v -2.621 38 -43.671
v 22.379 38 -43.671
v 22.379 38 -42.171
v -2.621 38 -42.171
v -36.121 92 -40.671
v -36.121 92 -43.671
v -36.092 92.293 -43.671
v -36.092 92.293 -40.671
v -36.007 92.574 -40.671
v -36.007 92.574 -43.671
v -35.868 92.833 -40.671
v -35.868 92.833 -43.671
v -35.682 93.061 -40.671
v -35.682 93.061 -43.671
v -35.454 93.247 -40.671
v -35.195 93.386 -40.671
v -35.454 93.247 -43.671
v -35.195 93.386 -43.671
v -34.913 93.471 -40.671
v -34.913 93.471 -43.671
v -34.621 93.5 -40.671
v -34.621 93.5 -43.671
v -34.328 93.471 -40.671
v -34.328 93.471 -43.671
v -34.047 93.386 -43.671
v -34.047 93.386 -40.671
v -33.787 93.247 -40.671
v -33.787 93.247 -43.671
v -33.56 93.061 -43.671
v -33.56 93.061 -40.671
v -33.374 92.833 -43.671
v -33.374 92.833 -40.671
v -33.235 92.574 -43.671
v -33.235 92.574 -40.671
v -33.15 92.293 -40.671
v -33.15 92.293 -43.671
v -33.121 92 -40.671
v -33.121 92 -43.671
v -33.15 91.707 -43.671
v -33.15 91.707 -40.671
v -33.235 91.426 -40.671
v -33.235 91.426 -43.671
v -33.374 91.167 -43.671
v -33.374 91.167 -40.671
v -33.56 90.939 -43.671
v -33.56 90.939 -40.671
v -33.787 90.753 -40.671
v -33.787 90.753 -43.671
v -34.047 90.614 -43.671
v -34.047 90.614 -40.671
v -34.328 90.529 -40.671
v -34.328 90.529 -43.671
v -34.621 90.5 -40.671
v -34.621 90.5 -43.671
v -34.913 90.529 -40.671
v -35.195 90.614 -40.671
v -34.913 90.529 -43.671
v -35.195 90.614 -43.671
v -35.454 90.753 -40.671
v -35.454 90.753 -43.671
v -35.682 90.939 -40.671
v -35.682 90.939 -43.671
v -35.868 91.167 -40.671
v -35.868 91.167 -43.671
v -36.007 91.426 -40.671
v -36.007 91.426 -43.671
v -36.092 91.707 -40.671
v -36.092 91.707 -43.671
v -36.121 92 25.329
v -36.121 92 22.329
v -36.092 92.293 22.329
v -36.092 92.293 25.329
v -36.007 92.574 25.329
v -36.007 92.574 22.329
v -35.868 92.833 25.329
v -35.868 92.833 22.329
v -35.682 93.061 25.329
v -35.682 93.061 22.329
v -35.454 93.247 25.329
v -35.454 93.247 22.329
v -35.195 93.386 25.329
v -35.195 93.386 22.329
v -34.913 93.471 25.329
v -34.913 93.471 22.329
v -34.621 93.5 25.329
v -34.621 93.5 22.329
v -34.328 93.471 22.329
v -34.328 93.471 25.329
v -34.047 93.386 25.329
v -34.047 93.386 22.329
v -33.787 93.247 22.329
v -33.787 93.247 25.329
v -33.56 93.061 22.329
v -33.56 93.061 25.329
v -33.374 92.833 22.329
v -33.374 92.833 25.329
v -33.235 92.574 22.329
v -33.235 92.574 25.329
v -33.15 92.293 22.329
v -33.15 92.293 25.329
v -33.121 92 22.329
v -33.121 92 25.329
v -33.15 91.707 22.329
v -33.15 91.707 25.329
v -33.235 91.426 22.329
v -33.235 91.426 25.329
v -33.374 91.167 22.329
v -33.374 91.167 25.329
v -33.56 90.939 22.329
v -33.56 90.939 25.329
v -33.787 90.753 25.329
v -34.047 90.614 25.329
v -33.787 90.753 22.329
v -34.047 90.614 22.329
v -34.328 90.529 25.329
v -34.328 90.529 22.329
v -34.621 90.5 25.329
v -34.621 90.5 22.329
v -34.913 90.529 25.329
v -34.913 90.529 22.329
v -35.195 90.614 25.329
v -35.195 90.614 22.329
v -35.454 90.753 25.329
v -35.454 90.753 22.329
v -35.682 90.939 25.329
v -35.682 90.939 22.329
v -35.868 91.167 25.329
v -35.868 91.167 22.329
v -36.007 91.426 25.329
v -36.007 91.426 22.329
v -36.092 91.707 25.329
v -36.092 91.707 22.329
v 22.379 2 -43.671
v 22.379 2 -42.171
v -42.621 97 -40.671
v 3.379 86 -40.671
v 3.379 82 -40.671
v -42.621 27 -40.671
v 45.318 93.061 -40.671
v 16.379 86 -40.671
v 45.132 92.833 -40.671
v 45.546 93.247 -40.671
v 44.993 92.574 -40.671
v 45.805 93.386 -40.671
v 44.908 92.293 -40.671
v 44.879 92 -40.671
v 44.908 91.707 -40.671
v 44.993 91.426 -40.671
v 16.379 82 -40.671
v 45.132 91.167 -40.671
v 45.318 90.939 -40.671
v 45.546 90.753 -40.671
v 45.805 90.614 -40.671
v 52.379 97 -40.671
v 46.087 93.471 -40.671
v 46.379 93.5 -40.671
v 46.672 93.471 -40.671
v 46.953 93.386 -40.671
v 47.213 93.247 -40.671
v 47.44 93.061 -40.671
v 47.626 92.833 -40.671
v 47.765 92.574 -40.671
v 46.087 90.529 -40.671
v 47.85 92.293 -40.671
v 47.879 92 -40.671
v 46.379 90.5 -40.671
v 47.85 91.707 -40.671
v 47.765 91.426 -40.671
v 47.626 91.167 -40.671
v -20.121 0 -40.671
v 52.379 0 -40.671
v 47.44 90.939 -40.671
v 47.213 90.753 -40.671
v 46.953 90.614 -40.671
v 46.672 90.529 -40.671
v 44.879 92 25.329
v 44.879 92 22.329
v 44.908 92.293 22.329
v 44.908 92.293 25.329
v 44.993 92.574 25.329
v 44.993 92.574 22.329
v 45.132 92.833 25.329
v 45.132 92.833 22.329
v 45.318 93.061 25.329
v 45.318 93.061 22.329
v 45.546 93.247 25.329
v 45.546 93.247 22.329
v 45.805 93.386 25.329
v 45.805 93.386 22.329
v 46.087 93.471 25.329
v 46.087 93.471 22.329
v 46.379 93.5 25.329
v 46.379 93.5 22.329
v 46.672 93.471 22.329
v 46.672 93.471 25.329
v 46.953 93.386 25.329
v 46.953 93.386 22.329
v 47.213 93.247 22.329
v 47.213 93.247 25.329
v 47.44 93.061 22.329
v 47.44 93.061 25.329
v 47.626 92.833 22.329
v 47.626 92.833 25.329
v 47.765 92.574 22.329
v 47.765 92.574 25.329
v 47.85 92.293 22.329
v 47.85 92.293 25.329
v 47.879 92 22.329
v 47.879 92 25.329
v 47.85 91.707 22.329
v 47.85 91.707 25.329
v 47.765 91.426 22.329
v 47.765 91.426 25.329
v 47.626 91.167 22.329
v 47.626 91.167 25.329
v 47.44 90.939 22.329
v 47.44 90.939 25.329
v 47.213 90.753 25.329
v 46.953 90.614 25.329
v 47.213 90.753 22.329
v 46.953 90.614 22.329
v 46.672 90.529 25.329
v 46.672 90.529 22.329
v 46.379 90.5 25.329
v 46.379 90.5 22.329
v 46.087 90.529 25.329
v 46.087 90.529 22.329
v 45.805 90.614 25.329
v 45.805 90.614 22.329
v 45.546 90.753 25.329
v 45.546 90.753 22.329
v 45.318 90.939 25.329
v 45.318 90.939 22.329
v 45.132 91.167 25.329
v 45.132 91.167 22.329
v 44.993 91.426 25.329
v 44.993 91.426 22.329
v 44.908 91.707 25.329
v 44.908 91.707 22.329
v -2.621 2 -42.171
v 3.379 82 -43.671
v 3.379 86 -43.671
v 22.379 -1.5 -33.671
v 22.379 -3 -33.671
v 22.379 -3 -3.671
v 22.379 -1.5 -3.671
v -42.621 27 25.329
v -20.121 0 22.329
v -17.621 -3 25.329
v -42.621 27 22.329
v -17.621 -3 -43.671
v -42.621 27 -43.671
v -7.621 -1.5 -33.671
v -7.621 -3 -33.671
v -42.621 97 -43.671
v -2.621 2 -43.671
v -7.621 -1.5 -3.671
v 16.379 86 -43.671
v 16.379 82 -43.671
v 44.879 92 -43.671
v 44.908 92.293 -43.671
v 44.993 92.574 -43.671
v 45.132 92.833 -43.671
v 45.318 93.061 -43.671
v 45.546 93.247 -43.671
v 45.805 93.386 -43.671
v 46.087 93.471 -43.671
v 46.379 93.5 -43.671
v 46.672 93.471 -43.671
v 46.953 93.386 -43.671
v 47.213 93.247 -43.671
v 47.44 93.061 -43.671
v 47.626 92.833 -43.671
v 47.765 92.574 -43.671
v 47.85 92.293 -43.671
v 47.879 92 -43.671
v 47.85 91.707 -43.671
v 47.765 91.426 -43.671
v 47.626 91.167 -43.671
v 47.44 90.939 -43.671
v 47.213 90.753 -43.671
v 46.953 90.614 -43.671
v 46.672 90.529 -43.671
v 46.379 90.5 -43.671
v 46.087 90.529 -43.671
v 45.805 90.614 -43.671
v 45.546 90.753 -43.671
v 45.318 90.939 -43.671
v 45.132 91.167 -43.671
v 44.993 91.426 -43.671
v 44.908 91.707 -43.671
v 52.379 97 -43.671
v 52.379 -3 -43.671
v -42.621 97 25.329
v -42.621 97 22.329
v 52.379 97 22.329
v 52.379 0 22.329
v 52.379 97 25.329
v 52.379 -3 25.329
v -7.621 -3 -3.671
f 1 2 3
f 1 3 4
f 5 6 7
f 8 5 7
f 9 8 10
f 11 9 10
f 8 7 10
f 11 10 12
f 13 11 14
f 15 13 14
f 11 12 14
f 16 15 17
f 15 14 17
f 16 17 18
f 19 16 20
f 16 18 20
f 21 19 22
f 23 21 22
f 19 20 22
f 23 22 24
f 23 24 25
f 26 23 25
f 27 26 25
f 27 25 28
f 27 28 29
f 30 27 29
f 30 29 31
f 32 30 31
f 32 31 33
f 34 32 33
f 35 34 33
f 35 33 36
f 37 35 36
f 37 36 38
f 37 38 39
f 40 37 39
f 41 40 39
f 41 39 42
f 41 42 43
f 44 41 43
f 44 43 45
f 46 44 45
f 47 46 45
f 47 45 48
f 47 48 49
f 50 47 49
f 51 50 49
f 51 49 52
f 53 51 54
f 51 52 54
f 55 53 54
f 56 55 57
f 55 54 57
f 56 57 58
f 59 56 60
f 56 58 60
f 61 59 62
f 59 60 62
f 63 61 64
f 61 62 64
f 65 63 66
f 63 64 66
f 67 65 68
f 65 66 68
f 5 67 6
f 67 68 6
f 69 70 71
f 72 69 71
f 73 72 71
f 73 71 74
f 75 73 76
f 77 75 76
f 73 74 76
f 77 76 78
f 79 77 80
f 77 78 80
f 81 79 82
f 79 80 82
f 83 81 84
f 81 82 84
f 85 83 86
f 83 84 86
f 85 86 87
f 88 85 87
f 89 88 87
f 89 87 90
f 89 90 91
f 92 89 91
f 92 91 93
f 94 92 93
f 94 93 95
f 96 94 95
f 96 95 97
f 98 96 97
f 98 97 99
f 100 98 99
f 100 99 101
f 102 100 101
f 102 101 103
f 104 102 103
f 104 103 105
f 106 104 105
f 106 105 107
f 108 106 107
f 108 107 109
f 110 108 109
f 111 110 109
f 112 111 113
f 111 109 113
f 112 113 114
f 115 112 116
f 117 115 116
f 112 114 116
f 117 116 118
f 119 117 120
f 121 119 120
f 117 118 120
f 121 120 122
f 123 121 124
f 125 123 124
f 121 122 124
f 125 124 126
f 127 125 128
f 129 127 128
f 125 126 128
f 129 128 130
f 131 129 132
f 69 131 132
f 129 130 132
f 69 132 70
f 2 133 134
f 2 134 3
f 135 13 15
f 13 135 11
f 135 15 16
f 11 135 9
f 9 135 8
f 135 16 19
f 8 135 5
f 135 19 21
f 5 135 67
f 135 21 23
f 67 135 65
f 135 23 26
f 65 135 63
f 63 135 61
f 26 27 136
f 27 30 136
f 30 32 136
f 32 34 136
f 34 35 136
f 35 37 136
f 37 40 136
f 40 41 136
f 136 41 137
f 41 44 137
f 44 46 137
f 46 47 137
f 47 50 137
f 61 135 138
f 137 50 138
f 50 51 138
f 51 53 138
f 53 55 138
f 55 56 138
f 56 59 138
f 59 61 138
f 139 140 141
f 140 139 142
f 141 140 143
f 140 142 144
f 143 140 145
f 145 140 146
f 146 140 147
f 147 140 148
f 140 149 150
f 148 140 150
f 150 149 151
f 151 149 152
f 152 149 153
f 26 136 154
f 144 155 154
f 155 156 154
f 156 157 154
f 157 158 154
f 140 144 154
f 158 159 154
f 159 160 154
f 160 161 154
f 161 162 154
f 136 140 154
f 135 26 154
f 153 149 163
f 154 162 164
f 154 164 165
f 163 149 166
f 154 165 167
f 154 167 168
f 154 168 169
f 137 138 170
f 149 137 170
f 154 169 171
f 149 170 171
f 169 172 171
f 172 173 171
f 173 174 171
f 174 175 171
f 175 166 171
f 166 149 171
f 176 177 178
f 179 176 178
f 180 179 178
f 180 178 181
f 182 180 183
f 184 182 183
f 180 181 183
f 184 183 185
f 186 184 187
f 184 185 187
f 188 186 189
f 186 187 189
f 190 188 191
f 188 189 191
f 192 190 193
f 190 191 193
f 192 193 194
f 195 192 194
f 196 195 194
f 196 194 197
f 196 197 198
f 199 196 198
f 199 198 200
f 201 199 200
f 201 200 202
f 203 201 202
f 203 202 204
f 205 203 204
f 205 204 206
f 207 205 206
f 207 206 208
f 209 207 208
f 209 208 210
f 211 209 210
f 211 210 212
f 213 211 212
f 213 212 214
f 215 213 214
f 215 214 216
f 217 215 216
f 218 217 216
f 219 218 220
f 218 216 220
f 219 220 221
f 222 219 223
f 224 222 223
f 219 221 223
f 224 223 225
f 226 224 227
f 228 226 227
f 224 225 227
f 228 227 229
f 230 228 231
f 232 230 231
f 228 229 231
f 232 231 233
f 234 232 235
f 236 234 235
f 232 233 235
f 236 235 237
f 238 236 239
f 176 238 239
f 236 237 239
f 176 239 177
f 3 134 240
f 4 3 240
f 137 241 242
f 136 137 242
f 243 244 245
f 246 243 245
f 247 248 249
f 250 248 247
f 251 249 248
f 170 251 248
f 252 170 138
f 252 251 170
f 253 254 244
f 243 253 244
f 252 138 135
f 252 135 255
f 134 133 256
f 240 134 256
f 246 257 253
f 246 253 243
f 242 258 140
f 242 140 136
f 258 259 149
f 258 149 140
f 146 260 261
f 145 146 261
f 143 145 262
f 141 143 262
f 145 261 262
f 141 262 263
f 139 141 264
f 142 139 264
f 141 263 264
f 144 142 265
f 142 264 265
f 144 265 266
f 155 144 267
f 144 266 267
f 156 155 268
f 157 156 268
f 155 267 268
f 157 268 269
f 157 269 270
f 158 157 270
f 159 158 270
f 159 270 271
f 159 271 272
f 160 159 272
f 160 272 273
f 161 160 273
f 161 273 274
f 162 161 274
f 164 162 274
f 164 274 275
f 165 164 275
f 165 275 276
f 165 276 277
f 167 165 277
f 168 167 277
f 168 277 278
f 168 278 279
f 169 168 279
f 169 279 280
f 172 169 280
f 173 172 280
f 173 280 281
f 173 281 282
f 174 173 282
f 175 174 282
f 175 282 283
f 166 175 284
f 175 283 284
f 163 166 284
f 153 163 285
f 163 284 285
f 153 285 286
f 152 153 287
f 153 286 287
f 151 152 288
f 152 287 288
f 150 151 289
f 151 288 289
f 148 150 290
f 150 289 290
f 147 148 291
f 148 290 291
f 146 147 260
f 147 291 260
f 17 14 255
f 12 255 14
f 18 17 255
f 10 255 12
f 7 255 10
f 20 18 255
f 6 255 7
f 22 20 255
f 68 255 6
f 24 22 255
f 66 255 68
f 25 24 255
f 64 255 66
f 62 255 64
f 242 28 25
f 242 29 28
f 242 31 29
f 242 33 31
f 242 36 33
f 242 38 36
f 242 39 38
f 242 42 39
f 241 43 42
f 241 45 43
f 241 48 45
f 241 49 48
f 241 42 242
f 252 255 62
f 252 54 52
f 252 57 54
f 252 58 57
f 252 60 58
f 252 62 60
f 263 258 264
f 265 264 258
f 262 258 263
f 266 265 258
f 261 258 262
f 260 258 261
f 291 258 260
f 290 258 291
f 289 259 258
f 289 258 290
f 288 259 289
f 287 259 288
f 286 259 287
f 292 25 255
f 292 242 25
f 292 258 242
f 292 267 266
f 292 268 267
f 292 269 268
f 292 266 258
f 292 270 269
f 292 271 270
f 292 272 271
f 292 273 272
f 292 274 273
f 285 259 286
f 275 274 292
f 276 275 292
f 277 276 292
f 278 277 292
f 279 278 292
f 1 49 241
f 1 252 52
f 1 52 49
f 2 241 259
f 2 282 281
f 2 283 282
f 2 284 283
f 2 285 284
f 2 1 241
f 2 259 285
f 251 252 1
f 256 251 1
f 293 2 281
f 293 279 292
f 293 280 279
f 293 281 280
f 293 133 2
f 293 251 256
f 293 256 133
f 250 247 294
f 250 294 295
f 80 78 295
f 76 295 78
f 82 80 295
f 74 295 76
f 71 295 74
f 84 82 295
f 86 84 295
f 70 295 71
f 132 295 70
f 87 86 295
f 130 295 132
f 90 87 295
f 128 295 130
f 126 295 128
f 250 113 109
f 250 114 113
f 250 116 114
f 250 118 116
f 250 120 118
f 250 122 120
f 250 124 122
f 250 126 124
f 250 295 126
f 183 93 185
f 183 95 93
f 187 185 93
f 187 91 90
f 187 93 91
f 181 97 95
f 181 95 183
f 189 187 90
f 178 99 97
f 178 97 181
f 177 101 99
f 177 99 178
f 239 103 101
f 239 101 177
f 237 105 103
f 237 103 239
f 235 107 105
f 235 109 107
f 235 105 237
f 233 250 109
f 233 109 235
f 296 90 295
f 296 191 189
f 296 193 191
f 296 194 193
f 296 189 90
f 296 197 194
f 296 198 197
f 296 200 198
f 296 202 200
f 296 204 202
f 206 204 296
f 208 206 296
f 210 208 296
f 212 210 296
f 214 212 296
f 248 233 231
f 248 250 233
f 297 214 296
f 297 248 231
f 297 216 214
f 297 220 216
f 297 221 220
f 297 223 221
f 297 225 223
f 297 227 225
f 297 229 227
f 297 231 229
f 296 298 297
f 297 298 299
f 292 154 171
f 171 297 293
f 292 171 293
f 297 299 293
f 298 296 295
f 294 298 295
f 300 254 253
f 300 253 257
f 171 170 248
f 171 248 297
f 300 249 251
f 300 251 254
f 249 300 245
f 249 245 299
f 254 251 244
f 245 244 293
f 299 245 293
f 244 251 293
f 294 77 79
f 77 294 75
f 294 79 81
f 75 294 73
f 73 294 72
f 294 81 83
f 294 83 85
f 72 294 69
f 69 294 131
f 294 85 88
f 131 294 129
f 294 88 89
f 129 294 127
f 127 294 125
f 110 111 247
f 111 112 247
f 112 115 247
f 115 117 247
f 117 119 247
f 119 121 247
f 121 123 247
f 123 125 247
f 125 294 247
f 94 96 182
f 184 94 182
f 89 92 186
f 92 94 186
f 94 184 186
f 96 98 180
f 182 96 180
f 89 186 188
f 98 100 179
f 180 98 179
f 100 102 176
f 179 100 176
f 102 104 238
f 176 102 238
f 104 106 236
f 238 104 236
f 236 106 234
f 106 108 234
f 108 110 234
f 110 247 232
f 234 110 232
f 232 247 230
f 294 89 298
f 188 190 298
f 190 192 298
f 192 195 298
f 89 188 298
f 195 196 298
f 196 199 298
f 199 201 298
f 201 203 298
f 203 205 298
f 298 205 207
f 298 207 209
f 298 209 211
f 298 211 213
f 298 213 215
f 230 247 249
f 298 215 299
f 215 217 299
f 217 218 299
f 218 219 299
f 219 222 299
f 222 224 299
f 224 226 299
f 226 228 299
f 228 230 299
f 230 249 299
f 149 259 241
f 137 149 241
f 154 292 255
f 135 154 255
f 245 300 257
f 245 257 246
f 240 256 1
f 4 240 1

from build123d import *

# Parameters (mm, degrees)
SKETCH1_W           = 95
SKETCH1_H           = 69
BOSS_EXTRUDE1_DEPTH = 3
SKETCH2_W           = 95
SKETCH2_H           = 3
BOSS_EXTRUDE2_DEPTH = 100
SKETCH3_W           = 95
SKETCH3_H           = 3
BOSS_EXTRUDE3_DEPTH = 100
SKETCH4_W           = 95
SKETCH4_H           = 3
CUT_EXTRUDE1_DEPTH  = 100
SKETCH5_W           = 25
SKETCH5_H           = 36
CUT_EXTRUDE2_DEPTH  = 1.5
SKETCH6_W           = 30
SKETCH6_H           = 30
CUT_EXTRUDE3_DEPTH  = 1.5
SKETCH7_R           = 1.5
CUT_EXTRUDE5_DEPTH  = 131.052204064
CUT_EXTRUDE6_DEPTH  = 131.052204064
SKETCH9_W           = 13
SKETCH9_H           = 4
CUT_EXTRUDE9_DEPTH  = 10


with BuildPart() as part:
    # Sketch1 → Boss-Extrude1 (new body)
    with BuildSketch(Plane(origin=(0, 0, 0), x_dir=(1, 0, 0), z_dir=(0, 1, 0))):
        with Locations((4.879154079, 9.171450151)):
            Rectangle(SKETCH1_W, SKETCH1_H)
    extrude(amount=-BOSS_EXTRUDE1_DEPTH)

    # Sketch2 → Boss-Extrude2 (add)
    with BuildSketch(Plane(origin=(0, 0, 0), x_dir=(1, 0, 0), z_dir=(0, 1, 0))):
        with Locations((4.879154079, -23.828549849)):
            Rectangle(SKETCH2_W, SKETCH2_H)
    extrude(amount=BOSS_EXTRUDE2_DEPTH)

    # Sketch3 → Boss-Extrude3 (add)
    with BuildSketch(Plane(origin=(0, 0, 0), x_dir=(1, 0, 0), z_dir=(0, 1, 0))):
        with Locations((4.879154079, 42.171450151)):
            Rectangle(SKETCH3_W, SKETCH3_H)
    extrude(amount=BOSS_EXTRUDE3_DEPTH)

    # Sketch4 → Cut-Extrude1 (cut)
    with BuildSketch(Plane(origin=(0, 0, -43.671450151), x_dir=(-1, 0, 0), z_dir=(0, 0, -1))):
        with Locations((-4.879154079, 98.5)):
            Rectangle(SKETCH4_W, SKETCH4_H)
    extrude(amount=-CUT_EXTRUDE1_DEPTH, mode=Mode.SUBTRACT)

    # Sketch5 → Cut-Extrude2 (cut)
    with BuildSketch(Plane(origin=(0, 0, -43.671450151), x_dir=(-1, 0, 0), z_dir=(0, 0, -1))):
        with Locations((-9.879154079, 20)):
            Rectangle(SKETCH5_W, SKETCH5_H)
    extrude(amount=-CUT_EXTRUDE2_DEPTH, mode=Mode.SUBTRACT)

    # Sketch6 → Cut-Extrude3 (cut)
    with BuildSketch(Plane.XZ.offset(3)):
        with Locations((7.379154079, -18.671450151)):
            Rectangle(SKETCH6_W, SKETCH6_H)
    extrude(amount=-CUT_EXTRUDE3_DEPTH, mode=Mode.SUBTRACT)

    # Sketch7 → Cut-Extrude5 (cut, through all)
    with BuildSketch(Plane(origin=(0, 0, -43.671450151), x_dir=(-1, 0, 0), z_dir=(0, 0, -1))):
        with Locations((34.620845921, 92)):
            Circle(SKETCH7_R)
        with Locations((-46.379154079, 92)):
            Circle(SKETCH7_R)
    extrude(amount=-CUT_EXTRUDE5_DEPTH, mode=Mode.SUBTRACT)

    # Sketch8 → Cut-Extrude6 (cut, through all)
    with BuildSketch(Plane(origin=(0, 0, -43.671450151), x_dir=(-1, 0, 0), z_dir=(0, 0, -1))):
        Polygon((42.620845921, -3), (17.620845921, -3), (42.620845921, 27), align=None)
    extrude(amount=-CUT_EXTRUDE6_DEPTH, mode=Mode.SUBTRACT)

    # Sketch9 → Cut-Extrude9 (cut)
    with BuildSketch(Plane(origin=(0, 0, -43.671450151), x_dir=(-1, 0, 0), z_dir=(0, 0, -1))):
        with Locations((-9.879154079, 84)):
            Rectangle(SKETCH9_W, SKETCH9_H)
    extrude(amount=-CUT_EXTRUDE9_DEPTH, mode=Mode.SUBTRACT)


solid = part.part
